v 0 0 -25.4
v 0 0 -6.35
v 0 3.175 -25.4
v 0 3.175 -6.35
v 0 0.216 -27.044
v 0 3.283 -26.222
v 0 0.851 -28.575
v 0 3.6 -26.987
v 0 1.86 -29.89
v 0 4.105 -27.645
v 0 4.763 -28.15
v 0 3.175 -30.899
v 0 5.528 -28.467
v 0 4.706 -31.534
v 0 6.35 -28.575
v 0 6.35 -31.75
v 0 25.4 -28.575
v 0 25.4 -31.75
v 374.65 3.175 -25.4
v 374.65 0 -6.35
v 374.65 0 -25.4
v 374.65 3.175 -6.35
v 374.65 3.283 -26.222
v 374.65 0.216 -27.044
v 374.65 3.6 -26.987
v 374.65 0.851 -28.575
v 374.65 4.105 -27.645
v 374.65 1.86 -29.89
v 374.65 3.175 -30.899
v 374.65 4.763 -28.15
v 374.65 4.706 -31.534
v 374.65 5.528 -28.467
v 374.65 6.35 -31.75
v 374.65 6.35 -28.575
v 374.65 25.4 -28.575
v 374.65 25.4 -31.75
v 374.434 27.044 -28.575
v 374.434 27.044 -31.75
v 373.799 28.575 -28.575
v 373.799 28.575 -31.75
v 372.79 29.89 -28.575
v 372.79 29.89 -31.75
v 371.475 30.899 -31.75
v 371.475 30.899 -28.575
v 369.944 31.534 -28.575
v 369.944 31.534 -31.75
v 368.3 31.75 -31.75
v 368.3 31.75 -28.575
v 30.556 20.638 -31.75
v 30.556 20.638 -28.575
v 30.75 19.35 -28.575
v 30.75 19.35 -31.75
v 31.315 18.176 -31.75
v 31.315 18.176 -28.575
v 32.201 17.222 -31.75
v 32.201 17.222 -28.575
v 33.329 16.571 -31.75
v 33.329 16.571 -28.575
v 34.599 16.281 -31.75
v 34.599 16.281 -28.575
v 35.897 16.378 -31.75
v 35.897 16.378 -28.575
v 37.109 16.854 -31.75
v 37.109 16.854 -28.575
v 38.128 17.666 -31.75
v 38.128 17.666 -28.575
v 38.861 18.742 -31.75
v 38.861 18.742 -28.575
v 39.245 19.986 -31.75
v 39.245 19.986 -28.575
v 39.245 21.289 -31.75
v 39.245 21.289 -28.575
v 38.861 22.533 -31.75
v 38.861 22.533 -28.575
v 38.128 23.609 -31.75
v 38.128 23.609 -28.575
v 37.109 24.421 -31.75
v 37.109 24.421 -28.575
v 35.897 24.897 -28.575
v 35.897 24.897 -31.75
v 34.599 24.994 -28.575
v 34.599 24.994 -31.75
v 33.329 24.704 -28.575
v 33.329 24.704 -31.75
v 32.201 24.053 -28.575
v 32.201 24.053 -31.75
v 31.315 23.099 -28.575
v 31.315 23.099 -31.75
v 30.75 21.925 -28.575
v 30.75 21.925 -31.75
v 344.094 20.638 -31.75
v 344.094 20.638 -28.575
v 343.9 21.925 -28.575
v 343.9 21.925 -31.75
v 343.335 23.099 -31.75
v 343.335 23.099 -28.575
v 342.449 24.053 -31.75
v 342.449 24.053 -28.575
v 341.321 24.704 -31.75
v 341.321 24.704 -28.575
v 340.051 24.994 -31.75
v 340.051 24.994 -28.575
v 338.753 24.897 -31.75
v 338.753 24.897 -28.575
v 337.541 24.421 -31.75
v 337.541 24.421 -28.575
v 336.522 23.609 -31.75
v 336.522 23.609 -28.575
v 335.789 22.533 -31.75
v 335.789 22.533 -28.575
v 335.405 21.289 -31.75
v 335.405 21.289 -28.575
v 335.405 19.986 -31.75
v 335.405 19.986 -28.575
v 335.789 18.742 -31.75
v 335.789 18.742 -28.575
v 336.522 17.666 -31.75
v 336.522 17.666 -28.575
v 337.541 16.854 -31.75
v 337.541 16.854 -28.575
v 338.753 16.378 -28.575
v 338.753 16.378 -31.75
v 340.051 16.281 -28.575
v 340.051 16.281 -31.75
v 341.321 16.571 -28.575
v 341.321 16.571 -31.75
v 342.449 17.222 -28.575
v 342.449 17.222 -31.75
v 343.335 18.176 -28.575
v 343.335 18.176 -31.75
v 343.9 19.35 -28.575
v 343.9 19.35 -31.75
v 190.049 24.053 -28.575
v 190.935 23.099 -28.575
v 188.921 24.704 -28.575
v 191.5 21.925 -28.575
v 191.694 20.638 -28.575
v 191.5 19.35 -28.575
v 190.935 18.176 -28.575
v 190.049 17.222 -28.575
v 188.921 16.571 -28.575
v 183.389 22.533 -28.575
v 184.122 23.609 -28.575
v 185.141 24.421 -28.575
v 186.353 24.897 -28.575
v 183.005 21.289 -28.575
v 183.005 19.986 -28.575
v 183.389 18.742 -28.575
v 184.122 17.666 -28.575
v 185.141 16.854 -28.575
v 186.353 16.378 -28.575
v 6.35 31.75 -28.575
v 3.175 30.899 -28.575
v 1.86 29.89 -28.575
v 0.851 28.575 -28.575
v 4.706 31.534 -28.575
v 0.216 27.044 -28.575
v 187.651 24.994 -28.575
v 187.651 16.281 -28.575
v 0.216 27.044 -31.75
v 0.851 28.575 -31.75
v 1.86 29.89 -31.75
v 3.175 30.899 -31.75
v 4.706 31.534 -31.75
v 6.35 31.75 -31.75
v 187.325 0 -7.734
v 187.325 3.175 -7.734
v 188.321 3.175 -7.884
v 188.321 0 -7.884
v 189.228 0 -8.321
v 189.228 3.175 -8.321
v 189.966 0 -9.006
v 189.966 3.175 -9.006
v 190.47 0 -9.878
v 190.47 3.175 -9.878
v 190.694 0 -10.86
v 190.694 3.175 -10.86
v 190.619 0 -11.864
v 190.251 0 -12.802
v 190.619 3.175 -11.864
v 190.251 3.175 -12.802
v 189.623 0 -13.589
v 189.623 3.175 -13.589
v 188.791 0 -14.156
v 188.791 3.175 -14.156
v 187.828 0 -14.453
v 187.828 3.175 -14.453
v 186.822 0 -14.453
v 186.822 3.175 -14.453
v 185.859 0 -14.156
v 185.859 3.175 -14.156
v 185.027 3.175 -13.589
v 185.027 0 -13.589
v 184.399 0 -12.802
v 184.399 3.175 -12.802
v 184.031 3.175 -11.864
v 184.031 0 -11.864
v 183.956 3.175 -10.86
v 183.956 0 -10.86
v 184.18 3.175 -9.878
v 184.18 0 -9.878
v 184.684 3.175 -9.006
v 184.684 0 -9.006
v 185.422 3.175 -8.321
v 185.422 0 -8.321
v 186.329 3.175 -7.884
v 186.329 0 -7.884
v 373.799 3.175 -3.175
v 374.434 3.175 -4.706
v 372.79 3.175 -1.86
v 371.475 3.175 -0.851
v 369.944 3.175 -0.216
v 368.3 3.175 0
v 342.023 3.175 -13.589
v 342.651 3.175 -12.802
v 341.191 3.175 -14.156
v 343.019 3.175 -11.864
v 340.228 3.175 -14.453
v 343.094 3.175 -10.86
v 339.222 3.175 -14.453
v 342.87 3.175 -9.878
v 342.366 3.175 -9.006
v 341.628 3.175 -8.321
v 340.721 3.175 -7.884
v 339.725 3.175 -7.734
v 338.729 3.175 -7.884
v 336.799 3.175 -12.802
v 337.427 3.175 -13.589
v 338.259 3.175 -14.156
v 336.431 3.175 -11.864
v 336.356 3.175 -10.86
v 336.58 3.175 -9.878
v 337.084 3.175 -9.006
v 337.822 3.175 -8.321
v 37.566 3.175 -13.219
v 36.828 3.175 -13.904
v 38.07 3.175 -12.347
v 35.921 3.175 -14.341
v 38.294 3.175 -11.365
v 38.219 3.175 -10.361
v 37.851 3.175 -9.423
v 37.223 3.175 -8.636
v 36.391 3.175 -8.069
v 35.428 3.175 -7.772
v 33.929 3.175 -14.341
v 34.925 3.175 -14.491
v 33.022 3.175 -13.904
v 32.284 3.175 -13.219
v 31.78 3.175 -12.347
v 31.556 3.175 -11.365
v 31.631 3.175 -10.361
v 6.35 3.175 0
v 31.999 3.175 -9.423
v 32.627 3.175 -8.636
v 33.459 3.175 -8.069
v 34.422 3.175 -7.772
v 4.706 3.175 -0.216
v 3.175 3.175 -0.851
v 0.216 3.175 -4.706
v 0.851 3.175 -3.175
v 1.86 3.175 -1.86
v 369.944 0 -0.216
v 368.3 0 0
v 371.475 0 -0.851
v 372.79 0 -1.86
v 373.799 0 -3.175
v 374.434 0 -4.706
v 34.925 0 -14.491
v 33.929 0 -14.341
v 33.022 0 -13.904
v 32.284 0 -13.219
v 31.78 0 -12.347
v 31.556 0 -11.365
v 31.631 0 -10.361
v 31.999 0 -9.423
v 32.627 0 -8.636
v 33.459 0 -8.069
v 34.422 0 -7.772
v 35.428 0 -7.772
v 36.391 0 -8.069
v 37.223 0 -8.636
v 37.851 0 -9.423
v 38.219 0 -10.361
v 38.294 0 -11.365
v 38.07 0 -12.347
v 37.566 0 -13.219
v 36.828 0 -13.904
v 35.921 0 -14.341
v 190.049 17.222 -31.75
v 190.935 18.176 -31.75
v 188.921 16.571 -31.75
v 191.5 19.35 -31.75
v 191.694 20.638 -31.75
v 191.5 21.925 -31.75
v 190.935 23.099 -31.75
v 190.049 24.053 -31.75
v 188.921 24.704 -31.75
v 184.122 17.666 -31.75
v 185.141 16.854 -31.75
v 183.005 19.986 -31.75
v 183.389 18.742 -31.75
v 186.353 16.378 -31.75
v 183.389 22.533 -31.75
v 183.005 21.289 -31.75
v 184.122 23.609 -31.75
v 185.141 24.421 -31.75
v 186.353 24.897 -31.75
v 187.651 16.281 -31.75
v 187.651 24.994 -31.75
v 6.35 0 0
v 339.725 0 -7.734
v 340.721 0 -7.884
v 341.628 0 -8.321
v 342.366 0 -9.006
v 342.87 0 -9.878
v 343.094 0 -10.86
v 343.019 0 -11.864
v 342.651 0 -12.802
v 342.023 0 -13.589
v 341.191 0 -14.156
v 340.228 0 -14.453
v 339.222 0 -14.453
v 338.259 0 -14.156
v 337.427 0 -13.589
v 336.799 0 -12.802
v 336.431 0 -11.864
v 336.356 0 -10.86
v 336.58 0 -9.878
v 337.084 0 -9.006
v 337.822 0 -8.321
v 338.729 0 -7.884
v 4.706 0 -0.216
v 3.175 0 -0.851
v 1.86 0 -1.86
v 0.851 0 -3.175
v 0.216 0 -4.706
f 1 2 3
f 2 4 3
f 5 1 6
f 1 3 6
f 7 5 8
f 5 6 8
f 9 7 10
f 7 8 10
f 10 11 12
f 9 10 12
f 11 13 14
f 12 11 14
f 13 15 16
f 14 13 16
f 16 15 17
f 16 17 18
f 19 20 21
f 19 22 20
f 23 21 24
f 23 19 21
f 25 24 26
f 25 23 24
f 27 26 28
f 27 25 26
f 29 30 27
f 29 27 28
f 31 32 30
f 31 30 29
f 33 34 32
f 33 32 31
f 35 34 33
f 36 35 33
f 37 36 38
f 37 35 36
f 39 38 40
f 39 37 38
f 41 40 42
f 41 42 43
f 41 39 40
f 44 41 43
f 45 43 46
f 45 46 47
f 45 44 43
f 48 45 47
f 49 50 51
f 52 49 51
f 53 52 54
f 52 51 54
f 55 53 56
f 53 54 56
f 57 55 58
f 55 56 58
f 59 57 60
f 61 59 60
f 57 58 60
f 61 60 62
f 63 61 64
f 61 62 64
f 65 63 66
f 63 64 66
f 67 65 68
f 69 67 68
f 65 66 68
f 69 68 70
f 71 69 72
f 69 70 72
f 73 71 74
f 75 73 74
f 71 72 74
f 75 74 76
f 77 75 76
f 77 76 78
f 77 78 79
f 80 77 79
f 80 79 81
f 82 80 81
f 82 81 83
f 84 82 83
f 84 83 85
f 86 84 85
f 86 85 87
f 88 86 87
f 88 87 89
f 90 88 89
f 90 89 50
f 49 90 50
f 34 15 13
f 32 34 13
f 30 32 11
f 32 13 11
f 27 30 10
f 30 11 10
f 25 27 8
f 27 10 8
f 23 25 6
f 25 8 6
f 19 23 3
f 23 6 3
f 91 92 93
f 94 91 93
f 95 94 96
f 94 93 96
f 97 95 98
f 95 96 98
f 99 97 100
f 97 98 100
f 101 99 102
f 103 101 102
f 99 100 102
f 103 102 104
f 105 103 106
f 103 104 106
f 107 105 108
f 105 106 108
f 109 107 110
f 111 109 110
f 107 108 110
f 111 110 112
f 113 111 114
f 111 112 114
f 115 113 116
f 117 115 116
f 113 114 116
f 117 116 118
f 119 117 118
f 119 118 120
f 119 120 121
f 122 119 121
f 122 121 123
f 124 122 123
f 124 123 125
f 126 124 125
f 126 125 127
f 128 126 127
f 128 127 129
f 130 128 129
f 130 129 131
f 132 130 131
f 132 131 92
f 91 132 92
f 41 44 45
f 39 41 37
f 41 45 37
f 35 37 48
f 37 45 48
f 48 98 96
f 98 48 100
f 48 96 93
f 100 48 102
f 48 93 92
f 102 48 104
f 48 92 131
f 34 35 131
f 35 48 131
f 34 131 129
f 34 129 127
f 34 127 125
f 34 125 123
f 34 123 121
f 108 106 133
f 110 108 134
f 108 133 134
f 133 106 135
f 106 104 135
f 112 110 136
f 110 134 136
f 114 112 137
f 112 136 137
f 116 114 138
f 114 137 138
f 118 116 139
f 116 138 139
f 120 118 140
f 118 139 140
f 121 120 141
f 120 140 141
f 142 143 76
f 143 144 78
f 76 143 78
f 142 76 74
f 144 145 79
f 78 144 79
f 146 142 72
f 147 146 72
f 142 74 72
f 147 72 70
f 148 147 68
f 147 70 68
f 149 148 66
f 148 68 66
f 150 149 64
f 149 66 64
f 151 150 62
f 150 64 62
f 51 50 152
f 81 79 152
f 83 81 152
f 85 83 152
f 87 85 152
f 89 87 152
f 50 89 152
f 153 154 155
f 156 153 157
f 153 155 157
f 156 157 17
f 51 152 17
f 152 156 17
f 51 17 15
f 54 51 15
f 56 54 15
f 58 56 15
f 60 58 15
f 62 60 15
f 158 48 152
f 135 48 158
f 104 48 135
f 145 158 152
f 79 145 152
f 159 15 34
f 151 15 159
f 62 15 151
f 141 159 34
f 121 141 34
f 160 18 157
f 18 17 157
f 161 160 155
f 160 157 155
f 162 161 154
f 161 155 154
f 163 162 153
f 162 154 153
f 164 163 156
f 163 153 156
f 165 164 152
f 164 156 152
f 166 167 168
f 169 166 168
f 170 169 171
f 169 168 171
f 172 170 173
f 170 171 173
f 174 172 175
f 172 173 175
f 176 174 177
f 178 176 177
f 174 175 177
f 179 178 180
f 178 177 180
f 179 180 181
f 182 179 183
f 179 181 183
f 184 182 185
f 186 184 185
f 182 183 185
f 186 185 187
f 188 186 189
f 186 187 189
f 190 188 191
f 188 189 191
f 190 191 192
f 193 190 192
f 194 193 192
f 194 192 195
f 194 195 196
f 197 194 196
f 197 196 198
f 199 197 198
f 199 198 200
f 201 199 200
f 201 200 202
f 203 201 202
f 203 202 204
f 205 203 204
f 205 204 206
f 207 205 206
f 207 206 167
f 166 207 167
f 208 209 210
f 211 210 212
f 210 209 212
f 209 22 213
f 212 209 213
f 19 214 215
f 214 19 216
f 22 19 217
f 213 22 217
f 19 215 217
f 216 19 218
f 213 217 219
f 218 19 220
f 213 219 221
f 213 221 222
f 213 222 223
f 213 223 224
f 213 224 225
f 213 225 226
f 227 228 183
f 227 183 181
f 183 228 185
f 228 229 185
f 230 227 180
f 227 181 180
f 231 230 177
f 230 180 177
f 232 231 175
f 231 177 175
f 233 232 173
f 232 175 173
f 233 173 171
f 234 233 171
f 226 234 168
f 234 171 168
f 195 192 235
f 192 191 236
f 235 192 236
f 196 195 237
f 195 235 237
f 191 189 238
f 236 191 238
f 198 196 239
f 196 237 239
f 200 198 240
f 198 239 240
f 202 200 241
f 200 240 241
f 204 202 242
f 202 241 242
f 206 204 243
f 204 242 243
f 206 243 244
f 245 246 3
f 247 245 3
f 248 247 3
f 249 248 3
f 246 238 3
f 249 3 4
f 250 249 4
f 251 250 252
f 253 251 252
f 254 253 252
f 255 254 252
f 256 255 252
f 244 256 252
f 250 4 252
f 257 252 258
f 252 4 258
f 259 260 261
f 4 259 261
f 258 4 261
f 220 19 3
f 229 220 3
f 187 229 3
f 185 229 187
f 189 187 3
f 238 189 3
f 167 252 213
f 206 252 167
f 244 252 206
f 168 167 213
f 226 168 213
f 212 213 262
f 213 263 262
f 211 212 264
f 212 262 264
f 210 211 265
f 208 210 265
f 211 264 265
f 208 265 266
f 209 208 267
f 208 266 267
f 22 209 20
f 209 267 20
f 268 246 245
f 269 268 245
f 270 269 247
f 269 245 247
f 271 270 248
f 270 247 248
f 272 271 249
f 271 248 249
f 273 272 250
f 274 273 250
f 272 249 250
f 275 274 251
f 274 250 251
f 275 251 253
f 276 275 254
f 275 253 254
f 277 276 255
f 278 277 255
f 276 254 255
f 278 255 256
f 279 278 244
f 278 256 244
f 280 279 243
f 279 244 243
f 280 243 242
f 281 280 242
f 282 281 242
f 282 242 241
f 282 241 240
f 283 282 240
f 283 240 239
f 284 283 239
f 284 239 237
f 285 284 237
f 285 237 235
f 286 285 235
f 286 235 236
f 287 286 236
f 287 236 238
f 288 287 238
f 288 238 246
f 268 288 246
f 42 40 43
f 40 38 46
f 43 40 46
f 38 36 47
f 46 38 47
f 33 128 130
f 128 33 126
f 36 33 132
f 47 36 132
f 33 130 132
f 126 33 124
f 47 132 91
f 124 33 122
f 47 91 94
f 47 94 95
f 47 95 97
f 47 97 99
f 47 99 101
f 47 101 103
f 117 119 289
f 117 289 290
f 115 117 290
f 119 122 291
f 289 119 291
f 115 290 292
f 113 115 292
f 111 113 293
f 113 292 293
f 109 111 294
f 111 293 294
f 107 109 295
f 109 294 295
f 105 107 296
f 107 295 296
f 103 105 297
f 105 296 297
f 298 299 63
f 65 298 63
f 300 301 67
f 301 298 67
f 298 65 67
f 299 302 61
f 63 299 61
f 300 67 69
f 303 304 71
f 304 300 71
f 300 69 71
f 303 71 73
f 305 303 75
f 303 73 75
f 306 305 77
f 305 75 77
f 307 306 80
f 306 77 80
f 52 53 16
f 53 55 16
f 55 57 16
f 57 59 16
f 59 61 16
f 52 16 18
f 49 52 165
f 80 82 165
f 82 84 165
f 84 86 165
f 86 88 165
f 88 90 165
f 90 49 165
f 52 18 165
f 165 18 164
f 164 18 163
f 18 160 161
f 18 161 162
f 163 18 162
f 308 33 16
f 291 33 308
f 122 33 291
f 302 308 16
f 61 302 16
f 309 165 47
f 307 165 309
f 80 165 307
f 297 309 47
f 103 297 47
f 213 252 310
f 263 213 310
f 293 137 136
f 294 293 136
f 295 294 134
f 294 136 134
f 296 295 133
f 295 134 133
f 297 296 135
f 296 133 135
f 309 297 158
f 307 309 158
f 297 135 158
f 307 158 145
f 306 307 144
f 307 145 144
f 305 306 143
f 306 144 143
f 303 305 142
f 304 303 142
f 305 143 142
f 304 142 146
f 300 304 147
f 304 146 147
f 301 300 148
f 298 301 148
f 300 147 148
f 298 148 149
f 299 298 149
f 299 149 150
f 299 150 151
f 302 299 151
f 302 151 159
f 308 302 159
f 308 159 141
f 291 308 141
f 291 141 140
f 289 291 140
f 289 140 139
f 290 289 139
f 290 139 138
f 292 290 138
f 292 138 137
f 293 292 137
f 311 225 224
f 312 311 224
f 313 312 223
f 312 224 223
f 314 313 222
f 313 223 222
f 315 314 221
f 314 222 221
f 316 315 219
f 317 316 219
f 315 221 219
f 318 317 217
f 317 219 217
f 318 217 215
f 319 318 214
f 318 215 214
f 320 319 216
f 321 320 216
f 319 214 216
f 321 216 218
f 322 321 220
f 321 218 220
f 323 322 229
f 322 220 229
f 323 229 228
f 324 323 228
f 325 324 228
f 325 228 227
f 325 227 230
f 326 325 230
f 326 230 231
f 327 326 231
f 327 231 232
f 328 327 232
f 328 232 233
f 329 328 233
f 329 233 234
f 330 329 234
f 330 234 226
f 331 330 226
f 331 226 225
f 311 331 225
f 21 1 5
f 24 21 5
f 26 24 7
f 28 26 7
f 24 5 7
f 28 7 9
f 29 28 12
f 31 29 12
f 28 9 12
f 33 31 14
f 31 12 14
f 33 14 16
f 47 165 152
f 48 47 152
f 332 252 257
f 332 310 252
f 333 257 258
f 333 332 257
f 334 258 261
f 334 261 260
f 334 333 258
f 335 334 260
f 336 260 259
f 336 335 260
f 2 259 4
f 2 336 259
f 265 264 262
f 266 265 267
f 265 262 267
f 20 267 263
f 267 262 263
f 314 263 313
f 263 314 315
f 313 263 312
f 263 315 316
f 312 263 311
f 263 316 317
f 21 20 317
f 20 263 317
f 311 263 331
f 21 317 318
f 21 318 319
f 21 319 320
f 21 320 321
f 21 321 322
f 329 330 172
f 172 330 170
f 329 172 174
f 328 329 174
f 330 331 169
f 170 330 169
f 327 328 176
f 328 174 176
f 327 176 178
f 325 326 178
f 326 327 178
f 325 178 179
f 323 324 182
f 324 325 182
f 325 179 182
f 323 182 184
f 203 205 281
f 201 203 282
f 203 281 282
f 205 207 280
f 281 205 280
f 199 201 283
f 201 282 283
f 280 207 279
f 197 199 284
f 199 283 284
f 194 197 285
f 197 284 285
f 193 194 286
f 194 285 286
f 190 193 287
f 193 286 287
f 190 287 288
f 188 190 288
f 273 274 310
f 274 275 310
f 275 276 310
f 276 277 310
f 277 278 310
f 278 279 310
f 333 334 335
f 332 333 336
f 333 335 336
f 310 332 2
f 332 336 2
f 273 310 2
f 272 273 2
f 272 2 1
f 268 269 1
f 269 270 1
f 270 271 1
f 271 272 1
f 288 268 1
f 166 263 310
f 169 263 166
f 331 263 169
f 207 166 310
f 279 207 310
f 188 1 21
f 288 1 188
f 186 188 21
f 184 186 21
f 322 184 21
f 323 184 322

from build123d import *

# Parameters (mm, degrees)
BASE_FLANGE1_DEPTH = 374.65
SKETCH6_R          = 3.3782
CUT_EXTRUDE1_DEPTH = 378.077201147
SKETCH7_R          = 4.3688
CUT_EXTRUDE2_DEPTH = 378.077201147
FILLET1_R          = 6.35


# Sheet-metal steps are written as plain solids
with BuildPart() as part:
    # Sketch1 → Base-Flange1 (new body)
    with BuildSketch(Plane(origin=(0, 0, 0), x_dir=(0, 0, -1), z_dir=(1, 0, 0))):
        with BuildLine():
            Line((0, 0), (25.4, 0))
            ThreePointArc((25.4, 0), (29.890128061, 1.859871939), (31.75, 6.35))
            Line((31.75, 6.35), (31.75, 31.75))
            Line((31.75, 31.75), (28.575, 31.75))
            Line((28.575, 31.75), (28.575, 6.35))
            ThreePointArc((28.575, 6.35), (27.64506403, 4.10493597), (25.4, 3.175))
            Line((25.4, 3.175), (0, 3.175))
            Line((0, 3.175), (0, 0))
        make_face()
    extrude(amount=BASE_FLANGE1_DEPTH)

    # Sketch6 → Cut-Extrude1 (cut, through all)
    with BuildSketch(Plane(origin=(0, 3.175, 0), x_dir=(1, 0, 0), z_dir=(0, 1, 0))):
        with Locations(Location((187.325, 11.1125, 0), (0, 0, 270))):
            Circle(SKETCH6_R)
        with Locations(Location((339.725, 11.1125, 0), (0, 0, 270))):
            Circle(SKETCH6_R)
        with Locations(Location((34.925, 11.1125, 0), (0, 0, 90))):
            Circle(SKETCH6_R)
    extrude(amount=-CUT_EXTRUDE1_DEPTH, mode=Mode.SUBTRACT)

    # Sketch7 → Cut-Extrude2 (cut, through all)
    with BuildSketch(Plane.XY.offset(-28.575)):
        with Locations((187.325, 20.6375)):
            Circle(SKETCH7_R)
        with Locations((339.725, 20.6375)):
            Circle(SKETCH7_R)
        with Locations(Location((34.925, 20.6375, 0), (0, 0, 180))):
            Circle(SKETCH7_R)
    extrude(amount=-CUT_EXTRUDE2_DEPTH, mode=Mode.SUBTRACT)

    # Fillet1
    fillet1_edges = [part.edges().sort_by_distance(p)[0] for p in [
        (374.65, 1.5875, 0),
        (0, 1.5875, 0),
        (374.65, 31.75, -30.1625),
        (0, 31.75, -30.1625),
    ]]
    fillet(fillet1_edges, radius=FILLET1_R)


solid = part.part
